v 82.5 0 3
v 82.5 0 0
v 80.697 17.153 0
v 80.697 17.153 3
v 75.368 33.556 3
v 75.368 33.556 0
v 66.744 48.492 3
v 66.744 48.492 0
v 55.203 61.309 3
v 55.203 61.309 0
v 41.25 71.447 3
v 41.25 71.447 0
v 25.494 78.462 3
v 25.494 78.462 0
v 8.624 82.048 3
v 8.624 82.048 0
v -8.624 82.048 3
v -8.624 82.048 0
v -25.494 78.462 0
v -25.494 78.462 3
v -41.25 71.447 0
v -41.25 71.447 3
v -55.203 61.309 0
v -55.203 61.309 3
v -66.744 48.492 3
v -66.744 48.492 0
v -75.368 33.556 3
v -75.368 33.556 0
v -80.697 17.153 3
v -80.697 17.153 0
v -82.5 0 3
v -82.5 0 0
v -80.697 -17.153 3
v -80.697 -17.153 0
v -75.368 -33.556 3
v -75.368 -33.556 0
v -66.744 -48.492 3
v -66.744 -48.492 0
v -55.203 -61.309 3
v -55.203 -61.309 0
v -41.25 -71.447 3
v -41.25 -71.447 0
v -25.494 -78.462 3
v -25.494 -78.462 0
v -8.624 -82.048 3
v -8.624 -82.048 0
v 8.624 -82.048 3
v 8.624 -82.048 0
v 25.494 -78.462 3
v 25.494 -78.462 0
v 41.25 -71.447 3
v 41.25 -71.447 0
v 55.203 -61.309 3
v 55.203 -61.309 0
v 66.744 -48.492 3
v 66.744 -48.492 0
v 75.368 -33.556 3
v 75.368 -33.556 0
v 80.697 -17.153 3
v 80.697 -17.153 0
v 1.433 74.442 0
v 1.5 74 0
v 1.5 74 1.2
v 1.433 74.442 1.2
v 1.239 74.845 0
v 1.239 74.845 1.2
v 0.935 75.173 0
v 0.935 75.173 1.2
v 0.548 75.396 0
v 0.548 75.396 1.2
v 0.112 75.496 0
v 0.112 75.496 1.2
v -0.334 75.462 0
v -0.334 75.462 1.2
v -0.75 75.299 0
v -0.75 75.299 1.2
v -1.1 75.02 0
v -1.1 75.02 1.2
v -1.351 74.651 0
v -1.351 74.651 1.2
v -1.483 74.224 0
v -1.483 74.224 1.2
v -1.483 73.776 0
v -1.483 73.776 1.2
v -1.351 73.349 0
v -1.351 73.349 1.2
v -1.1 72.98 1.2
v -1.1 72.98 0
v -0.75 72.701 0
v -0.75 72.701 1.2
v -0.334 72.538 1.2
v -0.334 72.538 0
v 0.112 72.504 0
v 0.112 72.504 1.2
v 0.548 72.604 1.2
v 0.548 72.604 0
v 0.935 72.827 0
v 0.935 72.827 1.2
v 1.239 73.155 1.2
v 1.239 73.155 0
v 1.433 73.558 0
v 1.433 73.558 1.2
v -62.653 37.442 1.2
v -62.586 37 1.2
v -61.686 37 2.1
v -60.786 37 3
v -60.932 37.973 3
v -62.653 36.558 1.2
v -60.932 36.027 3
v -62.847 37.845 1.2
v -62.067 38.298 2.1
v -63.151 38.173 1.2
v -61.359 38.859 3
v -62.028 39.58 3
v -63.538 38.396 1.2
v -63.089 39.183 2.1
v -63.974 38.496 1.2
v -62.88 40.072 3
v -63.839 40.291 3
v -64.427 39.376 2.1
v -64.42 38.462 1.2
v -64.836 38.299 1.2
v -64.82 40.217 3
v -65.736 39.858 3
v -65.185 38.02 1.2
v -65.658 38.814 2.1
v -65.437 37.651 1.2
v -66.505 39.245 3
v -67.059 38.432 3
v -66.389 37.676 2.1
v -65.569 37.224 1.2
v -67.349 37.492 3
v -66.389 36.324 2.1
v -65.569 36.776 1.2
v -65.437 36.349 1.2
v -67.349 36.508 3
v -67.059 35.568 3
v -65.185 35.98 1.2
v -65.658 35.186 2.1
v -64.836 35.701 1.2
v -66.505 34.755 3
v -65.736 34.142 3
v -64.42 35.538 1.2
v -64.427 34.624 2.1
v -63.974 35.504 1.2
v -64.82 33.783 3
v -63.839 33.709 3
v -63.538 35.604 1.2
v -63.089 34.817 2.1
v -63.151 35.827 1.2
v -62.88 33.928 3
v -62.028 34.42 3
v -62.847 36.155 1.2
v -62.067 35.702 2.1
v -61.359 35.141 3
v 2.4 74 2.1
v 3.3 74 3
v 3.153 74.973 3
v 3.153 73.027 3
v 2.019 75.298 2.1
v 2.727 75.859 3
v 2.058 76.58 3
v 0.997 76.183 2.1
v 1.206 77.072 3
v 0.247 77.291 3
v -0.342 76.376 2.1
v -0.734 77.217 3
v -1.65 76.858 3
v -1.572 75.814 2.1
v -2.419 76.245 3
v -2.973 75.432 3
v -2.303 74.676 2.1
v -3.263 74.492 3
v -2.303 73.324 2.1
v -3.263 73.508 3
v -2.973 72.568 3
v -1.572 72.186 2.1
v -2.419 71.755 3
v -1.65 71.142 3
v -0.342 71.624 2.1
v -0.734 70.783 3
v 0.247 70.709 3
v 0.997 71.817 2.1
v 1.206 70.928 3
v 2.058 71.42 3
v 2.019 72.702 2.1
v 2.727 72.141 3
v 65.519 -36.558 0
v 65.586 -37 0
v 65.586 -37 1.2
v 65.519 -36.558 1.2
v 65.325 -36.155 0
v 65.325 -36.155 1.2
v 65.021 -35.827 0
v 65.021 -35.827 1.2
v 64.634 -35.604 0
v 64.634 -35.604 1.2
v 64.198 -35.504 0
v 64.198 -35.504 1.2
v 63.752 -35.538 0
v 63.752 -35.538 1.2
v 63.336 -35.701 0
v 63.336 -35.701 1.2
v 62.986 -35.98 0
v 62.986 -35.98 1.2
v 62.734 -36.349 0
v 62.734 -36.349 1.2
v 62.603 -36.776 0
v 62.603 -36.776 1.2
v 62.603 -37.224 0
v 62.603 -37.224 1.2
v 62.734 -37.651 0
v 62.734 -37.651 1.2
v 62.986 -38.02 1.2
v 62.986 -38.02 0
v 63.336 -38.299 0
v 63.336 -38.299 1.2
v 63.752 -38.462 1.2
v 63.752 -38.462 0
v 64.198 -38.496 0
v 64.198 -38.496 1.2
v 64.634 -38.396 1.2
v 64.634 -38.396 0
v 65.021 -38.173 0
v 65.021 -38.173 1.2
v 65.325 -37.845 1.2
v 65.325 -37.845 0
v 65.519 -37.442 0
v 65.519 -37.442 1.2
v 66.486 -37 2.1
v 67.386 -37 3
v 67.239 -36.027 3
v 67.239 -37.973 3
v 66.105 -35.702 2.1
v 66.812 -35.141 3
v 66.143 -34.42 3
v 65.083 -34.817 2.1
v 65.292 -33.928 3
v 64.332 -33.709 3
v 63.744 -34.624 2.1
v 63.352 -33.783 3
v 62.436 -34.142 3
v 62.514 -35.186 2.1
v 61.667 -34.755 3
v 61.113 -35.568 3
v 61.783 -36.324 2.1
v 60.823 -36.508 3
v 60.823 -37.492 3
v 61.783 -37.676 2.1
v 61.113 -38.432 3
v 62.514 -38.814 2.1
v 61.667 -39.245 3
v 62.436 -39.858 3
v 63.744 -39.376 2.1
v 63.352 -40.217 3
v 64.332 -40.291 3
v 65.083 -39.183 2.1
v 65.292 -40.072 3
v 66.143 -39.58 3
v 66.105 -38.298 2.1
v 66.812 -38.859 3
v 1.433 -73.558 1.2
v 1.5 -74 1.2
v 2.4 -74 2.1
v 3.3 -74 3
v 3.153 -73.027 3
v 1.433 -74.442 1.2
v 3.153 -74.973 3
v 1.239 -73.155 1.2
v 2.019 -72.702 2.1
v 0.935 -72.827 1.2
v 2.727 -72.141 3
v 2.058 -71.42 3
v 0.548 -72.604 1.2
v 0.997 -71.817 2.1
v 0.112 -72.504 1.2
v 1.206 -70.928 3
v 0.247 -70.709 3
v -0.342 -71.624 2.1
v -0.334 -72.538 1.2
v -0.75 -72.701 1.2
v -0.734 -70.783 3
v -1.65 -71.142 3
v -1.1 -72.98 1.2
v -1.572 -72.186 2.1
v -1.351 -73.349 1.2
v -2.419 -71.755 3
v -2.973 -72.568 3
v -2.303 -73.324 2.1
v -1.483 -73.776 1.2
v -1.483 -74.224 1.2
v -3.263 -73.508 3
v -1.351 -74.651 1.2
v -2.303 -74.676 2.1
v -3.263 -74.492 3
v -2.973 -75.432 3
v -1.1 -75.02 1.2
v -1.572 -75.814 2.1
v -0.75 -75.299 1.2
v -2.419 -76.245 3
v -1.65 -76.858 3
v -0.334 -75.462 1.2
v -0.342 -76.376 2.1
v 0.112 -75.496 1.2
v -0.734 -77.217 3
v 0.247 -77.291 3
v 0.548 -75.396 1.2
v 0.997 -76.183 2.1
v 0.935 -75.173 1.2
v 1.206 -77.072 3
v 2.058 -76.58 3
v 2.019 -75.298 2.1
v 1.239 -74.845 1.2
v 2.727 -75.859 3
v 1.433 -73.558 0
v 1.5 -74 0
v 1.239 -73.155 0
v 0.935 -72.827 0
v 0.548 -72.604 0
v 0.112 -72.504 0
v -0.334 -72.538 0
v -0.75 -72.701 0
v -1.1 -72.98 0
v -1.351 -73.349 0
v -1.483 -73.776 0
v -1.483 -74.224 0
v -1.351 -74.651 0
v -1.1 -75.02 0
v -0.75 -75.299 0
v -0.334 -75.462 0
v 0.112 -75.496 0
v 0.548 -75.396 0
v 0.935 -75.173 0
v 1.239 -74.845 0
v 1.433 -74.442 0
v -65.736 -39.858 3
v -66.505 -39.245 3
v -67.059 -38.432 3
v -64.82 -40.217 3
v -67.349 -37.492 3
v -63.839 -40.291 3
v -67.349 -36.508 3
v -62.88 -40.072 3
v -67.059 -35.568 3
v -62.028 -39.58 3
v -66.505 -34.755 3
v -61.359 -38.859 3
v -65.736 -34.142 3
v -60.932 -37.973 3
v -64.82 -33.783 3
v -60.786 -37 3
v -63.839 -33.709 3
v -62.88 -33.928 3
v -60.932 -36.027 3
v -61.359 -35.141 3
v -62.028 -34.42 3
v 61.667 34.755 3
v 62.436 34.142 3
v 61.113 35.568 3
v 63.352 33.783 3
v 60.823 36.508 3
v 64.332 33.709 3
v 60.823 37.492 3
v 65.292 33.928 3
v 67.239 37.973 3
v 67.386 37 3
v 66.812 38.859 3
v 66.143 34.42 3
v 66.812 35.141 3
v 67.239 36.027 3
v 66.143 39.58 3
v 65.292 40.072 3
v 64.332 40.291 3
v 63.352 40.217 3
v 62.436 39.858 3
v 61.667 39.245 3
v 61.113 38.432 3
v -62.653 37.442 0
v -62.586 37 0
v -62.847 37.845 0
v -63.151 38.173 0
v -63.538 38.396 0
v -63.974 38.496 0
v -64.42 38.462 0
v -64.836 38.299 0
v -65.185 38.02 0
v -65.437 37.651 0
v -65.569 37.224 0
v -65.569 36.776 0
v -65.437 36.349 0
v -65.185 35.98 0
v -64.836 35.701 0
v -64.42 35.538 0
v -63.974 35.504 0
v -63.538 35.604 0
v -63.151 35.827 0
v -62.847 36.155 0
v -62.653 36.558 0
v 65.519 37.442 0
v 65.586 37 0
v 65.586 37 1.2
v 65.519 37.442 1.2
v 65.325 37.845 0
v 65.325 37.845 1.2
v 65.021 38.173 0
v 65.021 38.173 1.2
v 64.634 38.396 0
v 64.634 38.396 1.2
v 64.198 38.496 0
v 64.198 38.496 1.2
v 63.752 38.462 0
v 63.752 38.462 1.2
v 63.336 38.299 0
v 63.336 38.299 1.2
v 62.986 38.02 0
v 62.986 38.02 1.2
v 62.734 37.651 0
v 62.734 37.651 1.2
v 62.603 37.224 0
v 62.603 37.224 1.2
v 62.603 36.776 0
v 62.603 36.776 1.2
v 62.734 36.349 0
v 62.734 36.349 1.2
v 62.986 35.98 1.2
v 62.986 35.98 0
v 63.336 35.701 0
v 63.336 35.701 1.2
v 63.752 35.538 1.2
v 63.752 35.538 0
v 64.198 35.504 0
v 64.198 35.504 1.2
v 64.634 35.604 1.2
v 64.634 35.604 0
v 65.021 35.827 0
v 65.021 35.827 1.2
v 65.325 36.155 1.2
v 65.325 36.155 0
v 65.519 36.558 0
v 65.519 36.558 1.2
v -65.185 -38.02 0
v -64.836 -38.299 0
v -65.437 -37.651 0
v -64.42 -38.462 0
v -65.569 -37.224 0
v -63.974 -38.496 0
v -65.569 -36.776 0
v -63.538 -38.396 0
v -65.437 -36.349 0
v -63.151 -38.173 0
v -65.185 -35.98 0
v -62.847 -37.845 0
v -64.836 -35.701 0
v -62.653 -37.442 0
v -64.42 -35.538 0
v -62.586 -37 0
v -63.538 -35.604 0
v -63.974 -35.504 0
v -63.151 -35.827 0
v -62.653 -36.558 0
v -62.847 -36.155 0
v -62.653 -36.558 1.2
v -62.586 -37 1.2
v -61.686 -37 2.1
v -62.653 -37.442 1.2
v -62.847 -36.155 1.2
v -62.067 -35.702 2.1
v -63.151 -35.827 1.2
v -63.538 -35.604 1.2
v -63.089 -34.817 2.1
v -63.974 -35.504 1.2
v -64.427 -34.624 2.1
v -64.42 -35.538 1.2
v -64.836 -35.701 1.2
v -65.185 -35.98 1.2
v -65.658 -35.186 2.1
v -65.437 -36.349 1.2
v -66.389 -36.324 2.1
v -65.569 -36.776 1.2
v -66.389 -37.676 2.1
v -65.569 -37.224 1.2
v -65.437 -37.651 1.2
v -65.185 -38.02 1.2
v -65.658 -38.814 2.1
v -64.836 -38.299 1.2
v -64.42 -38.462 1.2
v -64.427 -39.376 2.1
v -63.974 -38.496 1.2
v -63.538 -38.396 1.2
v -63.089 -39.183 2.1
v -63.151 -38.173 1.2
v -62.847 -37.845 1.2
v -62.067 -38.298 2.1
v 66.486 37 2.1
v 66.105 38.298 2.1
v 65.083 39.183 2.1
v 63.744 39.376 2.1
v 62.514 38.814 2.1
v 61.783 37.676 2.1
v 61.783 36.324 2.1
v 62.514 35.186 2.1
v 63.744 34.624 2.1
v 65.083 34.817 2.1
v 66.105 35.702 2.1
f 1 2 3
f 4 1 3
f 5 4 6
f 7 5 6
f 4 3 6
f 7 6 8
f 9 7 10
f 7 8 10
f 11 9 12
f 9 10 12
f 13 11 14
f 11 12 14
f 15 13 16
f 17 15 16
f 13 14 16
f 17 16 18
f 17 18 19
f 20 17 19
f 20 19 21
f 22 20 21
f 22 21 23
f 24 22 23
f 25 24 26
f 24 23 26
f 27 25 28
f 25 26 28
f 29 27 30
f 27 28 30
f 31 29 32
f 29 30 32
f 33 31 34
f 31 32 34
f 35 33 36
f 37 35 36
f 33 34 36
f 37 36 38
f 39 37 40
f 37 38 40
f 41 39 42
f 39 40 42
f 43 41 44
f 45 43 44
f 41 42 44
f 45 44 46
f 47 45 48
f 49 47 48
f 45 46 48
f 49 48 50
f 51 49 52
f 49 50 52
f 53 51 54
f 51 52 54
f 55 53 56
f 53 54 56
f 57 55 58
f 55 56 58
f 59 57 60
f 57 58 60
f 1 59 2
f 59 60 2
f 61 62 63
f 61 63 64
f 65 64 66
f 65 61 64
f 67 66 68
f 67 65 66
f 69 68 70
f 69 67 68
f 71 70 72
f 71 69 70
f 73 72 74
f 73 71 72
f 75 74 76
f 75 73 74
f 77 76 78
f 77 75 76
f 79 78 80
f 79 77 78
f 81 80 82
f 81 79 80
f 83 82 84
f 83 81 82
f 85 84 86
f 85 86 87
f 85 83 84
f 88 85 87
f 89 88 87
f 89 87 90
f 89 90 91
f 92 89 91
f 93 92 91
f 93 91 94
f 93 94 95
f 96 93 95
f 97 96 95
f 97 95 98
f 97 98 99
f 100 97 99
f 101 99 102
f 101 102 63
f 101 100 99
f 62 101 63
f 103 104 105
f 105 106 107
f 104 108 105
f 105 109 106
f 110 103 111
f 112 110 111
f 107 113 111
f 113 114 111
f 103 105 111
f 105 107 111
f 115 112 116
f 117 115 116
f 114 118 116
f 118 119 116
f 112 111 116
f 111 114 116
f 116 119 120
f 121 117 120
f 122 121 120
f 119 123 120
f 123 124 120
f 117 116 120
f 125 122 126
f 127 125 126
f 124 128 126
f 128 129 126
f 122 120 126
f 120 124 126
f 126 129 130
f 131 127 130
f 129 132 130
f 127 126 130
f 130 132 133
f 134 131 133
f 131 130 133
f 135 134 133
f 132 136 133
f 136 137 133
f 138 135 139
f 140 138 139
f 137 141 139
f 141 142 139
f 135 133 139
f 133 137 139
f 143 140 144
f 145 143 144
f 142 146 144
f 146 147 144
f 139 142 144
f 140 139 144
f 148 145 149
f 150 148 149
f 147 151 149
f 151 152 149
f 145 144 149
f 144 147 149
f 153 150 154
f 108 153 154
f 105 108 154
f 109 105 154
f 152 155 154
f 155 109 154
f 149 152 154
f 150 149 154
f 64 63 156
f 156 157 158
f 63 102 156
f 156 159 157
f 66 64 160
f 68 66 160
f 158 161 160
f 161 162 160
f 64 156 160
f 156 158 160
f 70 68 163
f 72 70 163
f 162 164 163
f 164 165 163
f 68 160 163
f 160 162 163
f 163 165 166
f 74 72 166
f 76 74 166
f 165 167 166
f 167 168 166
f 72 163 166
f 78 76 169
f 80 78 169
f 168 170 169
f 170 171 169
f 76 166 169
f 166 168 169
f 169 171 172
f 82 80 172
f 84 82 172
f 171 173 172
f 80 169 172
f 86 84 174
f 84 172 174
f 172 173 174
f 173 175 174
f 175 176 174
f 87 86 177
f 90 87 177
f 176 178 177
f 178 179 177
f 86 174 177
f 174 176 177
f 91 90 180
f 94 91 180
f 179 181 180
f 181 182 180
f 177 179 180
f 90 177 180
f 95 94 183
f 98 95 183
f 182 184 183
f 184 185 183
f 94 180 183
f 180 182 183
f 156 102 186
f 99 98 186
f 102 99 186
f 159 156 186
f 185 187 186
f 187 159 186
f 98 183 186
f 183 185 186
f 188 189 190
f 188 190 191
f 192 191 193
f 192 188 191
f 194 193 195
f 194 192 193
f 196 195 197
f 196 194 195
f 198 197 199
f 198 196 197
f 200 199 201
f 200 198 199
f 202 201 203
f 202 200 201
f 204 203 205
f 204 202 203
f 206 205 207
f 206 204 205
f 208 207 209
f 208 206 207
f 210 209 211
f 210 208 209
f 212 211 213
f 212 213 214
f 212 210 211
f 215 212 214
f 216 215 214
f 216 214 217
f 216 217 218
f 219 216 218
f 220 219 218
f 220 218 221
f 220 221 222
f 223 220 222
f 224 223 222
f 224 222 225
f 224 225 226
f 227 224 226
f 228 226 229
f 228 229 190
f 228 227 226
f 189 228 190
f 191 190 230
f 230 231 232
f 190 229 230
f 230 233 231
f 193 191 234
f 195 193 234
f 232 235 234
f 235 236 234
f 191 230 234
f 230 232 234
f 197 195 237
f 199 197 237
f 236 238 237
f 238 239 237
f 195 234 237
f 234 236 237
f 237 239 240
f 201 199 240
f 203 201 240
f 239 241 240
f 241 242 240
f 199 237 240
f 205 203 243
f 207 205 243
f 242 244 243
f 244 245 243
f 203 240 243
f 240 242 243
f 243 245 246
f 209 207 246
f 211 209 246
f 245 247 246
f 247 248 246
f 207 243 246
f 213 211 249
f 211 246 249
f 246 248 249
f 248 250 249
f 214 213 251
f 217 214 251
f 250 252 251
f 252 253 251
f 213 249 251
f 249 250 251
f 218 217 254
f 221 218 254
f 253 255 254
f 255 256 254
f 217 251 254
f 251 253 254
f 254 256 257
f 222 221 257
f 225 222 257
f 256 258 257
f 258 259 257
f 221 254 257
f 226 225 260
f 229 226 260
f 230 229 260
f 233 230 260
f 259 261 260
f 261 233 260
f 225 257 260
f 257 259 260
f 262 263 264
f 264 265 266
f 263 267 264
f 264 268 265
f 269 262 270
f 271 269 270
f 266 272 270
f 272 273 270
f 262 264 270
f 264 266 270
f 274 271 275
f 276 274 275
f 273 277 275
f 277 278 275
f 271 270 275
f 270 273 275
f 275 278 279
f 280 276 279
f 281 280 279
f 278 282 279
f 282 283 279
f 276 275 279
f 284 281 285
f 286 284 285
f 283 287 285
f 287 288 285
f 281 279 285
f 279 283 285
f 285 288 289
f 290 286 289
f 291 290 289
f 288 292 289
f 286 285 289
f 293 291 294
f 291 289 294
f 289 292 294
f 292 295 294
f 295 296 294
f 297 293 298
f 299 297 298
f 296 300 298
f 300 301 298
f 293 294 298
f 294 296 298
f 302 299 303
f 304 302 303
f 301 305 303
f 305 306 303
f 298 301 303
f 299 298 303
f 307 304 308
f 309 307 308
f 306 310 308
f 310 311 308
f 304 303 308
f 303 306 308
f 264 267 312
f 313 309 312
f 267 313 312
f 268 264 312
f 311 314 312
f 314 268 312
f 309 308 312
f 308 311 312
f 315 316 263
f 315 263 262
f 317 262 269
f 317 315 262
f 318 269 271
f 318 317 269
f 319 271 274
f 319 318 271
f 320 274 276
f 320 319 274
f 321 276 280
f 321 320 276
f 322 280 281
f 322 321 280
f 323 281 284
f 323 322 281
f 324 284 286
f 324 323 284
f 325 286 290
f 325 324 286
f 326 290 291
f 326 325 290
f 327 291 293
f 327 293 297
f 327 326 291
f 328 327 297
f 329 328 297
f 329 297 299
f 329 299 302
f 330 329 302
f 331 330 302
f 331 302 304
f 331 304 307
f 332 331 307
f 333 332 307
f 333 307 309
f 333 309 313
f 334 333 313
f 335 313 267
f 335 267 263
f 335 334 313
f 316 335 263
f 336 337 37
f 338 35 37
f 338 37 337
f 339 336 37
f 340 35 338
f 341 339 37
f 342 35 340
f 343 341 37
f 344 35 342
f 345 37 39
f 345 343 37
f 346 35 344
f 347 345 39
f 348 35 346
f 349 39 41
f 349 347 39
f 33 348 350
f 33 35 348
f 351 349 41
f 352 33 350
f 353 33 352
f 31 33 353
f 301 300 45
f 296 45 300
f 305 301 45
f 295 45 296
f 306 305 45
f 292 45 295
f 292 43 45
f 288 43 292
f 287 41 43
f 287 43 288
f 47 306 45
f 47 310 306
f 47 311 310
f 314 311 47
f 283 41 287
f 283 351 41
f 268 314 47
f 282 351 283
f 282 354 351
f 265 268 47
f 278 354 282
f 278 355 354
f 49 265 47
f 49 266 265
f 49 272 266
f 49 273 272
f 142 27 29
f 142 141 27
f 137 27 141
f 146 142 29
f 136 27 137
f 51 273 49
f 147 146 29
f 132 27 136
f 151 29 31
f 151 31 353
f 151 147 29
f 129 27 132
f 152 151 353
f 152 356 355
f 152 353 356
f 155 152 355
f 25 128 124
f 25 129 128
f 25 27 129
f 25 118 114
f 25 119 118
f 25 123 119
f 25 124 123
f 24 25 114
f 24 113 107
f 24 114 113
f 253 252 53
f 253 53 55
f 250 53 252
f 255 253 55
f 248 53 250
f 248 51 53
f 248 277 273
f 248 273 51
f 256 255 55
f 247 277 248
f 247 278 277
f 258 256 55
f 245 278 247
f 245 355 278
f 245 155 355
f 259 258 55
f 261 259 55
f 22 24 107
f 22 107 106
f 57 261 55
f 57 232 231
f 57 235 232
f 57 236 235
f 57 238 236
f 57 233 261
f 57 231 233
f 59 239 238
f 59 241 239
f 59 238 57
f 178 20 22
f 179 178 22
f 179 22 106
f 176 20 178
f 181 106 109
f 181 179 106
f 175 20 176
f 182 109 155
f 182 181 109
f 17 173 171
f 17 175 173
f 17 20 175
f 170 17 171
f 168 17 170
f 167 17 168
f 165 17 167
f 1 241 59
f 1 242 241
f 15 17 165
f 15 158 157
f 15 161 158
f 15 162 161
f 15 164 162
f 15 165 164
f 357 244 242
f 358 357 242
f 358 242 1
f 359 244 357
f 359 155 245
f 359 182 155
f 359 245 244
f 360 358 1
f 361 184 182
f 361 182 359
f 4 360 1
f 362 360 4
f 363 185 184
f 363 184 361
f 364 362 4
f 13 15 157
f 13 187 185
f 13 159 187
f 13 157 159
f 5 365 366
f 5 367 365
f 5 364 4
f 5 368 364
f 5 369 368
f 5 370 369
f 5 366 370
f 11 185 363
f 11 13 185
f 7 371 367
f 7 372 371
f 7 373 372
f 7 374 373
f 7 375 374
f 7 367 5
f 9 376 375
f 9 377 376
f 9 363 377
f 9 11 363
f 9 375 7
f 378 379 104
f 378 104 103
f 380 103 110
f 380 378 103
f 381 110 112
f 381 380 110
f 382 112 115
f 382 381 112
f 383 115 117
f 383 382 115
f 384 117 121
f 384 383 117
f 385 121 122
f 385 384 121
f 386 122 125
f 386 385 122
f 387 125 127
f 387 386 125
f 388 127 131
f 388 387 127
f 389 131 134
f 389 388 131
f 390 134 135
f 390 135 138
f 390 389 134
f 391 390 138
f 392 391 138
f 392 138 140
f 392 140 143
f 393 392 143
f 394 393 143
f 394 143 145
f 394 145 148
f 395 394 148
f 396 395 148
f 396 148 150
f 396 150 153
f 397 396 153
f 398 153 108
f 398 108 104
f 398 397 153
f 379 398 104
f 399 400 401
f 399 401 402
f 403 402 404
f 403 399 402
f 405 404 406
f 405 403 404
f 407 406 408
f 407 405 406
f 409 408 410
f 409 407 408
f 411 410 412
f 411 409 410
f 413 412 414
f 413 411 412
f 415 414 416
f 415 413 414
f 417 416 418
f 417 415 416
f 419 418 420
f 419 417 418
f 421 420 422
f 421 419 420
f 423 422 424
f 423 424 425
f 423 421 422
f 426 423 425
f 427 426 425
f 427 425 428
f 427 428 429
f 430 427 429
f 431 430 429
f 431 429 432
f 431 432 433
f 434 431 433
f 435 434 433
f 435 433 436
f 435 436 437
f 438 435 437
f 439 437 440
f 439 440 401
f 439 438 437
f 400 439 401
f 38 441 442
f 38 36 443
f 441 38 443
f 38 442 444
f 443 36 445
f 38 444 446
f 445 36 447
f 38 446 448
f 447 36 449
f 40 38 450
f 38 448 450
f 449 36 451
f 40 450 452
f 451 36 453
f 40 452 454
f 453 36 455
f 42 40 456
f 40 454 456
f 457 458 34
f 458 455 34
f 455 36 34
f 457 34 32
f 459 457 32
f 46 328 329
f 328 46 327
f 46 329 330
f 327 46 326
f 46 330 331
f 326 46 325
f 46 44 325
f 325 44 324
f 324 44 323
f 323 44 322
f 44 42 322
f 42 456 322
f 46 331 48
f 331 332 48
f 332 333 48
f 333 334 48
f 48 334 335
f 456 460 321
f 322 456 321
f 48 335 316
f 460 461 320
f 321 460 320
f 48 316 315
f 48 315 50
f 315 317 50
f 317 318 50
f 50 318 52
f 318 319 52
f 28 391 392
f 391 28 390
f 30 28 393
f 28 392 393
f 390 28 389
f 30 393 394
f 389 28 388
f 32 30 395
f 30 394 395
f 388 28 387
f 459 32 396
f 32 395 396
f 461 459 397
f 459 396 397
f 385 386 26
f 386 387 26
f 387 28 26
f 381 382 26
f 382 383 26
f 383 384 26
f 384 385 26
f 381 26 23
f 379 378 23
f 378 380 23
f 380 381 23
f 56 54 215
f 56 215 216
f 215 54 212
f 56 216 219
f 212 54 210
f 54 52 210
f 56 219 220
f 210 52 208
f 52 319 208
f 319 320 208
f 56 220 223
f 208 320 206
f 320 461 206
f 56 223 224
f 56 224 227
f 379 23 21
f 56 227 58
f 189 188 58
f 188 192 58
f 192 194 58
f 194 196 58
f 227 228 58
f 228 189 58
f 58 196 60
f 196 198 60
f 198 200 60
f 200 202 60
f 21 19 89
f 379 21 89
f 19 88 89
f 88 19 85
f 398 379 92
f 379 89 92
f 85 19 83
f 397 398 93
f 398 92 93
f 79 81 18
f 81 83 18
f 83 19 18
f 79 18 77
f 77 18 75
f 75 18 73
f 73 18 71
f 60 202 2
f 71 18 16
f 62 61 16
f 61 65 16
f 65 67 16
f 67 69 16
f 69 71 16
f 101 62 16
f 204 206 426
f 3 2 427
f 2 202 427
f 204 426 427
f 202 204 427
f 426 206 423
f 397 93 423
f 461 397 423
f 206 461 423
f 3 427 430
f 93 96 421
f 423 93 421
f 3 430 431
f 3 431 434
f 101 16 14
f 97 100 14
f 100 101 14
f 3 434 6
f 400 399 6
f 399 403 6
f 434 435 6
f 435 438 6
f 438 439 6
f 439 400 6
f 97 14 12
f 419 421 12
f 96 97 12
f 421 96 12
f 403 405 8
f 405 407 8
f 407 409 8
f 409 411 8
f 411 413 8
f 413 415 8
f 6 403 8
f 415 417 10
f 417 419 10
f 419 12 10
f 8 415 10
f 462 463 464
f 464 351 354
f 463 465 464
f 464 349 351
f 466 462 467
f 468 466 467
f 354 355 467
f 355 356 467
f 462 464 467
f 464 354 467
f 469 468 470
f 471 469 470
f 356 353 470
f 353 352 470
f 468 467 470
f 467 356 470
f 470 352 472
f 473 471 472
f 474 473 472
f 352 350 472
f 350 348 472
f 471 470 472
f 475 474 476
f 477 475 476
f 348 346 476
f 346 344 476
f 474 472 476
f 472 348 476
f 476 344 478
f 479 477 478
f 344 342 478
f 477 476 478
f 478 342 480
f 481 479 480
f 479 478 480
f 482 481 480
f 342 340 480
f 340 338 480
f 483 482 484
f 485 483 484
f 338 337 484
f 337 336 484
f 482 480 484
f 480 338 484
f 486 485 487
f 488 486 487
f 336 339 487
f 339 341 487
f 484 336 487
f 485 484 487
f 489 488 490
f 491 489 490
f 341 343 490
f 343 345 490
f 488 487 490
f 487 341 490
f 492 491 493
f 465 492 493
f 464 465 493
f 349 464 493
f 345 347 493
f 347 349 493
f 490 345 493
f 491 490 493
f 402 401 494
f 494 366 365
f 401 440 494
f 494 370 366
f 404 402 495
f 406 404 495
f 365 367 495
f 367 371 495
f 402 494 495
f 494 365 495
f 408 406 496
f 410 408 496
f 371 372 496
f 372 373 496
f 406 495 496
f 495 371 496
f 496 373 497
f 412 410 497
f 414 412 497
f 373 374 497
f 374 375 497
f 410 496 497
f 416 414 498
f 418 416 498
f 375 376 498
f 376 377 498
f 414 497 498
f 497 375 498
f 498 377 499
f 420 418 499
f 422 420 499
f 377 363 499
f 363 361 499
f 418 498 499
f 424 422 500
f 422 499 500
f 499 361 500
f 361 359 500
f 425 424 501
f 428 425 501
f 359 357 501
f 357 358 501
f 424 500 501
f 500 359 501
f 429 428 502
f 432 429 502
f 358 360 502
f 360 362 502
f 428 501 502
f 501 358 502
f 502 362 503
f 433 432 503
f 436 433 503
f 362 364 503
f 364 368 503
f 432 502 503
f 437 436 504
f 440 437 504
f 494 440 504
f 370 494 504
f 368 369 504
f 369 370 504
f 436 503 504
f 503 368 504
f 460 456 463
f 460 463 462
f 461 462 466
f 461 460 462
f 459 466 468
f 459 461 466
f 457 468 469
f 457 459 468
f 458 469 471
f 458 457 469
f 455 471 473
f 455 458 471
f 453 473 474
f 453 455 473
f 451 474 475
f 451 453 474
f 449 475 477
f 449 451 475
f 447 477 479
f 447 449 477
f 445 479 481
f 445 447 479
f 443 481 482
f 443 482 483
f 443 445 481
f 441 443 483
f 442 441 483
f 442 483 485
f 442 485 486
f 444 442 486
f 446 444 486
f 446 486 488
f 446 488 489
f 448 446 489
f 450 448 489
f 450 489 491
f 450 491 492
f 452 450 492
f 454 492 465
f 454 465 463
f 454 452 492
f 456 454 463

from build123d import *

# Parameters (mm, degrees)
SKETCH1_R           = 82.5
SKETCH1_R_2         = 1.5
BOSS_EXTRUDE1_DEPTH = 3
CHAMFER1_SIZE       = 1.8


with BuildPart() as part:
    # Sketch1 → Boss-Extrude1 (new body)
    with BuildSketch(Plane.XY):
        Circle(SKETCH1_R)
        with Locations((0, 74)):
            Circle(SKETCH1_R_2, mode=Mode.SUBTRACT)
        with Locations((0, -74)):
            Circle(SKETCH1_R_2, mode=Mode.SUBTRACT)
        with Locations((64.08587988, 37)):
            Circle(SKETCH1_R_2, mode=Mode.SUBTRACT)
        with Locations((64.08587988, -37)):
            Circle(SKETCH1_R_2, mode=Mode.SUBTRACT)
        with Locations((-64.08587988, -37)):
            Circle(SKETCH1_R_2, mode=Mode.SUBTRACT)
        with Locations((-64.08587988, 37)):
            Circle(SKETCH1_R_2, mode=Mode.SUBTRACT)
    extrude(amount=BOSS_EXTRUDE1_DEPTH)

    # Chamfer1
    chamfer1_edges = [part.edges().sort_by_distance(p)[0] for p in [
        (62.58587988, 37, 3),
        (62.58587988, -37, 3),
        (-65.58587988, -37, 3),
        (-65.58587988, 37, 3),
        (-1.5, 74, 3),
        (-1.5, -74, 3),
    ]]
    chamfer(chamfer1_edges, length=CHAMFER1_SIZE)


solid = part.part
